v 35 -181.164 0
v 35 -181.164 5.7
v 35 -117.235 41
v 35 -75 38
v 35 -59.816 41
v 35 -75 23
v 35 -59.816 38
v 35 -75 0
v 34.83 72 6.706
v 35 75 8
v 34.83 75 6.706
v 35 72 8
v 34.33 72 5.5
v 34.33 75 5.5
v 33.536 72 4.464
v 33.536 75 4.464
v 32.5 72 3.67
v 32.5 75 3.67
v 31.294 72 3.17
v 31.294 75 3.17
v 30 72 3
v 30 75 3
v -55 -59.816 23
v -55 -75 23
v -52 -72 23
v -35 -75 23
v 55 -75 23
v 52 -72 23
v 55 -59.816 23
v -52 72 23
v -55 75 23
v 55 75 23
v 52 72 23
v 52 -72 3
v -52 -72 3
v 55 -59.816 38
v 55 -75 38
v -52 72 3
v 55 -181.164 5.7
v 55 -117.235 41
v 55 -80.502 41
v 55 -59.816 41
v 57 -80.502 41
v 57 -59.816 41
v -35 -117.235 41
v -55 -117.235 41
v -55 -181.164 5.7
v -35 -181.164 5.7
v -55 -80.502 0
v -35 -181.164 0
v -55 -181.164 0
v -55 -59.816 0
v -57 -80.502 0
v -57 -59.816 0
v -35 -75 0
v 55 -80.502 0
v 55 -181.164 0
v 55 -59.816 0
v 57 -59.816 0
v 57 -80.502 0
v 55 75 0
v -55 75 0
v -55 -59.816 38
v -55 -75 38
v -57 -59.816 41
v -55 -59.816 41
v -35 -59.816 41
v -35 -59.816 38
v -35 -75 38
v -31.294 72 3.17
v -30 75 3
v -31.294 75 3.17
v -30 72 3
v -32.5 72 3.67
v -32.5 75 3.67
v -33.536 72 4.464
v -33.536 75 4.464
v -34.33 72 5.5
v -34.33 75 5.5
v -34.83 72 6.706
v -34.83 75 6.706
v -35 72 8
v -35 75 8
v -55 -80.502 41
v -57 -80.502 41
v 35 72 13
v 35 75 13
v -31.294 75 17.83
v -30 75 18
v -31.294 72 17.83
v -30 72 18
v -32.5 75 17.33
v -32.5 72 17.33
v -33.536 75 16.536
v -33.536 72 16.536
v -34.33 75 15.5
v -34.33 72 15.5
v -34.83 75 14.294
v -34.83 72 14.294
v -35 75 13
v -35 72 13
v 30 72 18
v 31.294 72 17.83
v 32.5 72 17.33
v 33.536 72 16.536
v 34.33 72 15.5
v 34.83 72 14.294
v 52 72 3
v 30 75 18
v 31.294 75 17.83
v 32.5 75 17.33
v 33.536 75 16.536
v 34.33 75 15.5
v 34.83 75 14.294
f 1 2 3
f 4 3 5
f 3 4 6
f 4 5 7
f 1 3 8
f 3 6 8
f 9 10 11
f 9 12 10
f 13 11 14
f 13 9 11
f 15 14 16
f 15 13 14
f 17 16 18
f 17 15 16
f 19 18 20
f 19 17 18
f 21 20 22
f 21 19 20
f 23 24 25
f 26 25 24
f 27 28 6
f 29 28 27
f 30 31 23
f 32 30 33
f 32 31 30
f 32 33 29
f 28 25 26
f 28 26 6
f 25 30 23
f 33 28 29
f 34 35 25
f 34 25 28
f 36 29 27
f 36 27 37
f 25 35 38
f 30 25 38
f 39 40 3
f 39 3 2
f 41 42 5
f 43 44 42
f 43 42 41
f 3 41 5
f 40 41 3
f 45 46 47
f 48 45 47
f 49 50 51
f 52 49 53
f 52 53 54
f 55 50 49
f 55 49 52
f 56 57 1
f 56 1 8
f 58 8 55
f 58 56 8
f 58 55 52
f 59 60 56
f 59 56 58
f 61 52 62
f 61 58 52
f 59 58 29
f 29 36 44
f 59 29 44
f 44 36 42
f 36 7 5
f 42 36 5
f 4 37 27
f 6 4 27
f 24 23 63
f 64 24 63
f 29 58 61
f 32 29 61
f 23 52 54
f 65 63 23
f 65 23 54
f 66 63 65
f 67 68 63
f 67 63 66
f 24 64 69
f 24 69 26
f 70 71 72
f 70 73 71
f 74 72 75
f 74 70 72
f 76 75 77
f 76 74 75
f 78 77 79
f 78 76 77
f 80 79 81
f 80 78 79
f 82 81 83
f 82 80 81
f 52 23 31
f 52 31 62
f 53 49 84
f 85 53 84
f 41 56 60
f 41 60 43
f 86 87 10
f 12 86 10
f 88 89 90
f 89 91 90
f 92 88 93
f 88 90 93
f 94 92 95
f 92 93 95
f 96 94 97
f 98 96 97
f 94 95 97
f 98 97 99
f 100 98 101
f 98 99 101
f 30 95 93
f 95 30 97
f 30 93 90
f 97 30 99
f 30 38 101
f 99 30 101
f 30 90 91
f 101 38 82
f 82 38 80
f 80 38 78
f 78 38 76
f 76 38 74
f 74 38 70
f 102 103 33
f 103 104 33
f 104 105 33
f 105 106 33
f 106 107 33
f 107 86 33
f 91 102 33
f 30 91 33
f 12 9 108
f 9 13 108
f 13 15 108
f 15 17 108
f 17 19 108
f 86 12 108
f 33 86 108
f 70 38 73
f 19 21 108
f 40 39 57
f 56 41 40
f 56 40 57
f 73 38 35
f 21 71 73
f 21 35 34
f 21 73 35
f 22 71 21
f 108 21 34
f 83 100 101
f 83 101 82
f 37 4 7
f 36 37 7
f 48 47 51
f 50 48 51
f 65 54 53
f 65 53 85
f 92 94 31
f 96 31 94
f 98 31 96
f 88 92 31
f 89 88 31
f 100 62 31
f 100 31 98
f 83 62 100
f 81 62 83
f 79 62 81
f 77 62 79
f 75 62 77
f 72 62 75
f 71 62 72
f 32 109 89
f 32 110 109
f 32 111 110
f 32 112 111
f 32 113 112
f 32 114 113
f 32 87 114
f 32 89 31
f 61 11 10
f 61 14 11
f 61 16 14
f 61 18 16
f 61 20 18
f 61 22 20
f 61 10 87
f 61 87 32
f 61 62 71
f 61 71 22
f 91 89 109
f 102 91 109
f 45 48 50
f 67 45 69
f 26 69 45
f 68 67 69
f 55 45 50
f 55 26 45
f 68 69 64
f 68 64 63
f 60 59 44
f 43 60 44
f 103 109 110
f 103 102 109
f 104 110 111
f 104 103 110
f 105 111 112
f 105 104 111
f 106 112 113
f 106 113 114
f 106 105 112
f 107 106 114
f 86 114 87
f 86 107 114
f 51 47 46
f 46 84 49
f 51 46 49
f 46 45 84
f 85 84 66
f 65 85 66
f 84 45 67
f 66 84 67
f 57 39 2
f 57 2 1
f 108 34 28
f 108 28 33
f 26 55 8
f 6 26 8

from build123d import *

# Parameters (mm, degrees)
SKETCH_1_W          = 110
SKETCH_1_H          = 150
EXTRUDE_1_DEPTH     = 3
SKETCH_2_W          = 110
SKETCH_2_H          = 150
SKETCH_2_W_2        = 104
SKETCH_2_H_2        = 144
EXTRUDE_2_DEPTH     = 20
EXTRUDE_3_DEPTH     = 20
SKETCH_4_W          = 41
SKETCH_4_H          = 20.685891883
EXTRUDE_4_DEPTH     = 2
SKETCH_5_W          = 70
SKETCH_5_H          = 15
CUT_EXTRUDE_1_DEPTH = 8
FILLET_1_R          = 5


with BuildPart() as part:
    # 草图1 → 凸台-拉伸1 (new body)
    with BuildSketch(Plane.XY):
        Rectangle(SKETCH_1_W, SKETCH_1_H)
    extrude(amount=EXTRUDE_1_DEPTH)

    # 草图2 → 凸台-拉伸2 (add)
    with BuildSketch(Plane.XY.offset(3)):
        Rectangle(SKETCH_2_W, SKETCH_2_H)
        Rectangle(SKETCH_2_W_2, SKETCH_2_H_2, mode=Mode.SUBTRACT)
    extrude(amount=EXTRUDE_2_DEPTH)

    # 草图3 → 凸台-拉伸3 (add)
    with BuildSketch(Plane.ZY.offset(55)):
        Polygon((23, -75), (38, -75), (38, -59.816209212), (41, -59.816209212), (41, -117.234969842), (5.700174456, -181.163787756), (0, -181.163787756), (0, -75), align=None)
    extrude_3 = extrude(amount=-EXTRUDE_3_DEPTH)

    # 草图4 → 凸台-拉伸4 (add)
    with BuildSketch(Plane.ZY.offset(55)):
        with Locations((20.5, -70.159155153)):
            Rectangle(SKETCH_4_W, SKETCH_4_H)
    extrude_4 = extrude(amount=EXTRUDE_4_DEPTH)

    # 草图5 → 切除-拉伸1 (cut)
    with BuildSketch(Plane(origin=(0, 75, 0), x_dir=(1, 0, 0), z_dir=(0, 1, 0))):
        with Locations((0, -10.5)):
            Rectangle(SKETCH_5_W, SKETCH_5_H)
    extrude(amount=-CUT_EXTRUDE_1_DEPTH, mode=Mode.SUBTRACT)

    # 圆角1
    fillet_1_edges = [part.edges().sort_by_distance(p)[0] for p in [
        (-35, 73.5, 18),
        (-35, 73.5, 3),
        (35, 73.5, 3),
        (35, 73.5, 18),
    ]]
    fillet(fillet_1_edges, radius=FILLET_1_R)

    # 镜向1: 凸台-拉伸4 across plane
    add(extrude_4.mirror(Plane(origin=(0, 0, 0), x_dir=(0, 0, 1), z_dir=(1, 0, 0))))

    # 镜向2: 凸台-拉伸3 across plane
    add(extrude_3.mirror(Plane(origin=(0, 0, 0), x_dir=(0, 0, 1), z_dir=(1, 0, 0))))


solid = part.part
